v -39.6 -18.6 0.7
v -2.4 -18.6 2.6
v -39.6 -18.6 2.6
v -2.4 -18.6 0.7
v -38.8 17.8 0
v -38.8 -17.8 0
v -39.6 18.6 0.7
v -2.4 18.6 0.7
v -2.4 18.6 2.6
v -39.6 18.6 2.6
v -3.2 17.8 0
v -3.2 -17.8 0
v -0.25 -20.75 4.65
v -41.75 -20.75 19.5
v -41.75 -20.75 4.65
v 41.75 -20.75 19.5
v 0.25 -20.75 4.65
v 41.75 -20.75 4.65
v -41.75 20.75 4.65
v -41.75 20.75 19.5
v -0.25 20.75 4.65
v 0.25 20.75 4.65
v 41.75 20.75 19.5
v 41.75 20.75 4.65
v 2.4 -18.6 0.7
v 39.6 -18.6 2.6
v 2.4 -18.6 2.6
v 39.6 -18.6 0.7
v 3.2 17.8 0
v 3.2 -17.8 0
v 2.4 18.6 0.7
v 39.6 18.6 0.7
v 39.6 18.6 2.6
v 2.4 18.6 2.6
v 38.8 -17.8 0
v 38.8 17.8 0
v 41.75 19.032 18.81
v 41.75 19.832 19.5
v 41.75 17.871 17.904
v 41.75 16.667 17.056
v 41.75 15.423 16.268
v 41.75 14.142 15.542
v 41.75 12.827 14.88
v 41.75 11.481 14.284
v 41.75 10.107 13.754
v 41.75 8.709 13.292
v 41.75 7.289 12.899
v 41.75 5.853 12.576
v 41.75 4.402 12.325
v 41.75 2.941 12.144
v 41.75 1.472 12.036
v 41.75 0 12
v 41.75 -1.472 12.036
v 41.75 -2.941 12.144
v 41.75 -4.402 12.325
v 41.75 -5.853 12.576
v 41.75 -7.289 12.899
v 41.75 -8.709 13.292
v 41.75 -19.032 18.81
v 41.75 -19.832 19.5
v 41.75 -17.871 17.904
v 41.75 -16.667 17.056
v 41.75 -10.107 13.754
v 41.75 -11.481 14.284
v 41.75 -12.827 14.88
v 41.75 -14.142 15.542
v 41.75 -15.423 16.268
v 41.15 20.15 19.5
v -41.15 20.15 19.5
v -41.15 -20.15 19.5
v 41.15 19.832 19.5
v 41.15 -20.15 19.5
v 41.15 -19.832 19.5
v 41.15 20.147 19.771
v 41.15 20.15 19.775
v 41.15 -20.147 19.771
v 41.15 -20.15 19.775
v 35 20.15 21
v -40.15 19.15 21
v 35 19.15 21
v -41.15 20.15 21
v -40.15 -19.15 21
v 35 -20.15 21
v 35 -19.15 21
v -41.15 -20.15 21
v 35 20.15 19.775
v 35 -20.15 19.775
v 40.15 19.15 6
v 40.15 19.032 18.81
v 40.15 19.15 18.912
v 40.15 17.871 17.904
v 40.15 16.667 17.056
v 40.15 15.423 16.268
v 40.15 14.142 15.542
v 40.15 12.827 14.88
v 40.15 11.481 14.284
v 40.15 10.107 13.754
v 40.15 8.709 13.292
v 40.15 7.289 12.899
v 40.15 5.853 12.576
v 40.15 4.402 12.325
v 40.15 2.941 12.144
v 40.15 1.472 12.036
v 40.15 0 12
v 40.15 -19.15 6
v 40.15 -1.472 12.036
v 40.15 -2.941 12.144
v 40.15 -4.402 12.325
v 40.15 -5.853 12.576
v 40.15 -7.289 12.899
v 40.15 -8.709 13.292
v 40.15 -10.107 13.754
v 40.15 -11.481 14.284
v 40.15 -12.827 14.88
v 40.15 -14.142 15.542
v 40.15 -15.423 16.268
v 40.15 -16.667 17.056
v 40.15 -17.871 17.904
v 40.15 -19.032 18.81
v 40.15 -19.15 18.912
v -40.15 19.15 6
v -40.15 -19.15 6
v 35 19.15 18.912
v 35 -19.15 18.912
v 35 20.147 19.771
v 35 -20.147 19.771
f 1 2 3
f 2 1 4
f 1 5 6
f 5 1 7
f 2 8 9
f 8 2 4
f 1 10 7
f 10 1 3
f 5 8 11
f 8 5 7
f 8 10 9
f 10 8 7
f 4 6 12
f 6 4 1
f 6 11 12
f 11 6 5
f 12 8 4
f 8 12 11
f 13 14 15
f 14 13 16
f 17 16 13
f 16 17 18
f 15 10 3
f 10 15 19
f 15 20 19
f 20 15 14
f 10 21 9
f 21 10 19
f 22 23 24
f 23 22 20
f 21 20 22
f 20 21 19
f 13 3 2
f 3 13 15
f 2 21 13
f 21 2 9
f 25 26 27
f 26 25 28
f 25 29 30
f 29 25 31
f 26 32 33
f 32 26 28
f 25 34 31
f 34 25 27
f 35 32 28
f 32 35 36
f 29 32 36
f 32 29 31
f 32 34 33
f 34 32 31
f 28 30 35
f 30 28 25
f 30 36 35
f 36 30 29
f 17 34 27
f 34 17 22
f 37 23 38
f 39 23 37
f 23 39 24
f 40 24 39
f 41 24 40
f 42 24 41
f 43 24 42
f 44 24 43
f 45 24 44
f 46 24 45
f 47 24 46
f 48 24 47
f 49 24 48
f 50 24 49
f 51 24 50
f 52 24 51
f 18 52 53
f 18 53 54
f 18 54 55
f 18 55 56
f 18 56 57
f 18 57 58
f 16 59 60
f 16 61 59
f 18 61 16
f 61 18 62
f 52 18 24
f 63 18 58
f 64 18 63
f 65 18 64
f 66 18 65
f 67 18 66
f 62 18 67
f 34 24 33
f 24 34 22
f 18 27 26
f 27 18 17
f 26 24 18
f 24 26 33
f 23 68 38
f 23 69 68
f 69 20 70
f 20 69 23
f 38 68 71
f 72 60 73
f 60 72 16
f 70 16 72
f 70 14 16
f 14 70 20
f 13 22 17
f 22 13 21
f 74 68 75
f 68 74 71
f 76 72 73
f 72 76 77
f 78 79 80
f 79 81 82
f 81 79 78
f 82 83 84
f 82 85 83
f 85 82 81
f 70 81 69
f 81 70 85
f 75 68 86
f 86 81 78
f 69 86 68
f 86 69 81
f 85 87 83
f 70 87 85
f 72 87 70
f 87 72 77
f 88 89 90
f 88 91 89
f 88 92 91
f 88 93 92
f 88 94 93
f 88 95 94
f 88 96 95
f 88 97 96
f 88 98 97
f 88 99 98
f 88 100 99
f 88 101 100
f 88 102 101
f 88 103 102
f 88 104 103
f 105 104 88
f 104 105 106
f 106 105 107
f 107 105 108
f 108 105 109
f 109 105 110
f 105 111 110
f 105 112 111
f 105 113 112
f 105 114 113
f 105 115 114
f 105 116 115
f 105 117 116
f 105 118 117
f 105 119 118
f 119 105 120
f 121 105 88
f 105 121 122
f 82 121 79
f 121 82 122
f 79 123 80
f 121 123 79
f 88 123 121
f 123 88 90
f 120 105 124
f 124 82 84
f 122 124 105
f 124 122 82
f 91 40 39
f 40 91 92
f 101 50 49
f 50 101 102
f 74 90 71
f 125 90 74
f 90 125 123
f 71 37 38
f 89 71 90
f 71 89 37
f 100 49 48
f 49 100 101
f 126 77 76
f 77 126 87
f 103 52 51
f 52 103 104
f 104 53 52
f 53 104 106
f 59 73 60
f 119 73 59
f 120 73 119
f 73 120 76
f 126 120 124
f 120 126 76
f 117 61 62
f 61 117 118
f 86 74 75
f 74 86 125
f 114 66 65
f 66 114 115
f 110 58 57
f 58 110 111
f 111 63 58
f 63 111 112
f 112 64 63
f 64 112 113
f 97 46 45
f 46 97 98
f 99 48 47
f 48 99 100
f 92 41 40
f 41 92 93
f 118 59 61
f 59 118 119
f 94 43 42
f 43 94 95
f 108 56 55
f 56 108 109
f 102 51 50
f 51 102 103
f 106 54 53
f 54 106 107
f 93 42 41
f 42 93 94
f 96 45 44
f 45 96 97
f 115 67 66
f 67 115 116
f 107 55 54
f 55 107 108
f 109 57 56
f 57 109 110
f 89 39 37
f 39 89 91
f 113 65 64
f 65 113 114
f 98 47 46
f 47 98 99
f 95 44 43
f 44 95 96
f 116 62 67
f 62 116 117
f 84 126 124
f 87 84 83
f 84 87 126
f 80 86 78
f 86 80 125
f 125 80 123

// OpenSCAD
// Gridfinity bin, 2x1 x 3U tall
// Outside 83.5 x 41.5 mm, height 21 mm (3x7mm), PLA, 0.4mm nozzle, no supports
// Print orientation: +Z up, bottom (foot bottoms) on bed at z=0

Lx = 83.5;
Ly = 41.5;
H = 21;
foot_z0 = 0;
foot_z1 = 0.8;
foot_z2 = 2.6;   // 0.8+1.8
foot_z3 = 4.75;  // 0.8+1.8+2.15
foot_btm = 35.6; // 41.5-5.9
foot_mid = 37.2; // 35.6+1.6
foot_top = 41.5;
wall_t = 1.6;
floor_z = 6.0;
lip_z = 19.5;
lip_inset = 0.6;

echo(cadverify_spec = [
    ["bounds", [[-41.75, -20.75, 0], [41.75, 20.75, 21]]],
    ["bodies", 1],
    ["through_holes", 0],
    ["support_faces", [["bed", "-z", 2000]]],
    ["overhangs_allowed", []],
    ["copies", 1],
    ["details", [
        ["foot_left", "material", [[-30, -10, 0.1], [-12, 10, 0.7]], 0.9],
        ["foot_right", "material", [[12, -10, 0.1], [30, 10, 0.7]], 0.9],
        ["stack_lip", "material", [[-20, 19.3, 19.6], [20, 20.0, 20.9]], 0.9],
        ["label_shelf", "material", [[-30, 16, 6.5], [30, 18.5, 8]], 0.9],
        ["scoop_void", "void", [[40.5, -10, 14], [42.5, 10, 20]], 0.9],
        ["wall_side", "thickness", [38, 22, 10], [0, -1, 0], 1.6],
        ["floor", "thickness", [-21, 0, -5], [0, 0, 1], 6.0],
        ["foot_profile", "view", [[-39, -18, 0], [-3, 18, 5]]],
        ["scoop_view", "view", [[35, -15, 10], [43, 15, 22]]],
        ["label_view", "view", [[-10, 12, 6], [10, 20, 13]]],
        ["lip_view", "view", [[-15, 18.5, 18.5], [15, 21, 21.5]]]
    ]]
]);

module foot(cx) {
    translate([cx, 0, 0]) {
        // bottom 45deg frustum: 35.6 -> 37.2 over 0.8
        hull() {
            translate([-foot_btm/2, -foot_btm/2, 0]) cube([foot_btm, foot_btm, 0.1]);
            translate([-foot_mid/2, -foot_mid/2, foot_z1-0.1]) cube([foot_mid, foot_mid, 0.1]);
        }
        // vertical 1.8
        translate([-foot_mid/2, -foot_mid/2, foot_z1]) cube([foot_mid, foot_mid, foot_z2-foot_z1]);
        // top 45deg frustum: 37.2 -> 41.5 over 2.15
        hull() {
            translate([-foot_mid/2, -foot_mid/2, foot_z2]) cube([foot_mid, foot_mid, 0.1]);
            translate([-foot_top/2, -foot_top/2, foot_z3-0.1]) cube([foot_top, foot_top, 0.1]);
        }
    }
}

module bin_solid() {
    foot(-21);
    foot(21);
    // main outer body, overlap feet top by 0.1
    translate([-Lx/2, -Ly/2, foot_z3-0.1]) cube([Lx, Ly, lip_z-(foot_z3-0.1)]);
    // stacking lip: stepped inward 0.6 per side, no overhang
    translate([-(Lx-2*lip_inset)/2, -(Ly-2*lip_inset)/2, lip_z]) cube([Lx-2*lip_inset, Ly-2*lip_inset, H-lip_z]);
    // label shelf wedge along +Y inside, sits on floor against wall
    // y_in=19.15, bottom from 13.15 to 19.35, top from 17.65 to 19.35
    hull() {
        translate([-35, 13.15, 5.9]) cube([70, 19.35-13.15, 0.2]);
        translate([-35, 17.65, 11.9]) cube([70, 19.35-17.65, 0.2]);
    }
}

module bin() {
    difference() {
        bin_solid();
        // interior cavity, open top
        translate([-(Lx-2*wall_t)/2, -(Ly-2*wall_t)/2, floor_z]) cube([Lx-2*wall_t, Ly-2*wall_t, H-floor_z+1]);
        // scoop at +X front: cylinder axis X, R30 center z42 -> bottom 12 at center
        translate([41.0, 0, 42]) rotate([0, 90, 0]) cylinder(r=30, h=12, center=true, $fn=128);
    }
}

bin();
